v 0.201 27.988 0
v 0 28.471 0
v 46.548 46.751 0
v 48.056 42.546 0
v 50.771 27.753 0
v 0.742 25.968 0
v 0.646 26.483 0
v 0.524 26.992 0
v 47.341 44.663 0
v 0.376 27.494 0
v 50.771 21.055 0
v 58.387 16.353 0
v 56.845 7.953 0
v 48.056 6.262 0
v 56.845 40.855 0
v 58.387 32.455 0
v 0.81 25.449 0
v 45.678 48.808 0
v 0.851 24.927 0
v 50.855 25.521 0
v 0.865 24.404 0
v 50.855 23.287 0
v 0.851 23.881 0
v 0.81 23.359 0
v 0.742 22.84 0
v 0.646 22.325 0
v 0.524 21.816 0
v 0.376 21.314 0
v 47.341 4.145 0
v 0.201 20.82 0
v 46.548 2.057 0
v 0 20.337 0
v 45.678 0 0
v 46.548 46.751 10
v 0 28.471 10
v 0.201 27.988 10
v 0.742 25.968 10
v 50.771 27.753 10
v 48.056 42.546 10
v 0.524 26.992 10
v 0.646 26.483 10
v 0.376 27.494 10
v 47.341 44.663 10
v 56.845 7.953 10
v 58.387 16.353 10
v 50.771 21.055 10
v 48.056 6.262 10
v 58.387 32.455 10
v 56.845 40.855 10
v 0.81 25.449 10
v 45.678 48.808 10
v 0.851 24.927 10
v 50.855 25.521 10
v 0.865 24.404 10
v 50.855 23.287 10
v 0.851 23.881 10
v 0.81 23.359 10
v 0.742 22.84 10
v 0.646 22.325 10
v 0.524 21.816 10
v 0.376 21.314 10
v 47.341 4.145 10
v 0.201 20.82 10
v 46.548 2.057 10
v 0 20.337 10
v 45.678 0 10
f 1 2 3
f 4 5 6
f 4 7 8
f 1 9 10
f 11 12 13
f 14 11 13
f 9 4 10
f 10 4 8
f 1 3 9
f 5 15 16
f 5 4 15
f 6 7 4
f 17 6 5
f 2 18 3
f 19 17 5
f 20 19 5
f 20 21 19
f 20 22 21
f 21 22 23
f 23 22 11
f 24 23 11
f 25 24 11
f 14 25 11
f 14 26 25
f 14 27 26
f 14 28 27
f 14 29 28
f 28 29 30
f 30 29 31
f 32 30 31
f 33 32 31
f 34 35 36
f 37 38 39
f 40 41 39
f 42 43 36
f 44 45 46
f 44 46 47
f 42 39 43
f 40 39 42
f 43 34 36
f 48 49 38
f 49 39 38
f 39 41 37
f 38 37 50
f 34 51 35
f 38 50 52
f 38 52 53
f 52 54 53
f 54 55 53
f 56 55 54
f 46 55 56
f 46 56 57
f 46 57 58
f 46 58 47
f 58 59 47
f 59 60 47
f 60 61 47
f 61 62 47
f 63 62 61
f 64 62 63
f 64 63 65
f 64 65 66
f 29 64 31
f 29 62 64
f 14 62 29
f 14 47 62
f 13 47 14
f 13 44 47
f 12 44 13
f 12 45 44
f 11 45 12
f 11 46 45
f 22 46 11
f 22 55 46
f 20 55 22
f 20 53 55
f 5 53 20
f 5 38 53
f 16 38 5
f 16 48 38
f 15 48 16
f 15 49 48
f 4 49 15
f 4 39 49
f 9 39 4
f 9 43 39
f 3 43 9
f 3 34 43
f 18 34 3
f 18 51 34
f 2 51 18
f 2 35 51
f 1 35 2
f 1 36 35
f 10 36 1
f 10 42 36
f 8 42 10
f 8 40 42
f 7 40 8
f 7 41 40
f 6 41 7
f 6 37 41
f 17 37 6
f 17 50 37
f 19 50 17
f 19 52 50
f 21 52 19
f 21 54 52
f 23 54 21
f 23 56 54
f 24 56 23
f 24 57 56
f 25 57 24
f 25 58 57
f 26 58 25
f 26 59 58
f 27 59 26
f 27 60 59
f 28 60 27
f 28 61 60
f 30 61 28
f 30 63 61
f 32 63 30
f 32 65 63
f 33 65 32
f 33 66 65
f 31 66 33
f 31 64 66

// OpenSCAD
$fn = 32;

// ----------------------------------------------------------------------
// Gear sector: 2 teeth on 48 degrees
// ----------------------------------------------------------------------

// --- parameters (mm) ---
sector_angle = 48;        // sector angle, degrees
root_r = 60;              // root circle radius
tooth_h = 8;              // tooth height over the root circle
teeth = 2;                // number of teeth on the sector
hub_r = 10;               // hub bore radius
plate_t = 10;             // sector thickness, Z
arc_step = 3;             // sampling step of the root/hub arcs, degrees

tip_r = root_r + tooth_h;  // tip circle radius

profile = [[45.678, 0], [46.548, 2.057], [47.341, 4.145], [48.056, 6.262], [56.845, 7.953], [58.387, 16.353], [50.771, 21.055], [50.855, 23.287], [50.855, 25.521], [50.771, 27.753], [58.387, 32.455], [56.845, 40.855], [48.056, 42.546], [47.341, 44.663], [46.548, 46.751], [45.678, 48.808], [0, 28.471], [0.201, 27.988], [0.376, 27.494], [0.524, 26.992], [0.646, 26.483], [0.742, 25.968], [0.81, 25.449], [0.851, 24.927], [0.865, 24.404], [0.851, 23.881], [0.81, 23.359], [0.742, 22.84], [0.646, 22.325], [0.524, 21.816], [0.376, 21.314], [0.201, 20.82], [0, 20.337]];  // primary outline, 33 points, counter clockwise

// --- the one profile operation ---
linear_extrude(height = plate_t) polygon(points = profile);
